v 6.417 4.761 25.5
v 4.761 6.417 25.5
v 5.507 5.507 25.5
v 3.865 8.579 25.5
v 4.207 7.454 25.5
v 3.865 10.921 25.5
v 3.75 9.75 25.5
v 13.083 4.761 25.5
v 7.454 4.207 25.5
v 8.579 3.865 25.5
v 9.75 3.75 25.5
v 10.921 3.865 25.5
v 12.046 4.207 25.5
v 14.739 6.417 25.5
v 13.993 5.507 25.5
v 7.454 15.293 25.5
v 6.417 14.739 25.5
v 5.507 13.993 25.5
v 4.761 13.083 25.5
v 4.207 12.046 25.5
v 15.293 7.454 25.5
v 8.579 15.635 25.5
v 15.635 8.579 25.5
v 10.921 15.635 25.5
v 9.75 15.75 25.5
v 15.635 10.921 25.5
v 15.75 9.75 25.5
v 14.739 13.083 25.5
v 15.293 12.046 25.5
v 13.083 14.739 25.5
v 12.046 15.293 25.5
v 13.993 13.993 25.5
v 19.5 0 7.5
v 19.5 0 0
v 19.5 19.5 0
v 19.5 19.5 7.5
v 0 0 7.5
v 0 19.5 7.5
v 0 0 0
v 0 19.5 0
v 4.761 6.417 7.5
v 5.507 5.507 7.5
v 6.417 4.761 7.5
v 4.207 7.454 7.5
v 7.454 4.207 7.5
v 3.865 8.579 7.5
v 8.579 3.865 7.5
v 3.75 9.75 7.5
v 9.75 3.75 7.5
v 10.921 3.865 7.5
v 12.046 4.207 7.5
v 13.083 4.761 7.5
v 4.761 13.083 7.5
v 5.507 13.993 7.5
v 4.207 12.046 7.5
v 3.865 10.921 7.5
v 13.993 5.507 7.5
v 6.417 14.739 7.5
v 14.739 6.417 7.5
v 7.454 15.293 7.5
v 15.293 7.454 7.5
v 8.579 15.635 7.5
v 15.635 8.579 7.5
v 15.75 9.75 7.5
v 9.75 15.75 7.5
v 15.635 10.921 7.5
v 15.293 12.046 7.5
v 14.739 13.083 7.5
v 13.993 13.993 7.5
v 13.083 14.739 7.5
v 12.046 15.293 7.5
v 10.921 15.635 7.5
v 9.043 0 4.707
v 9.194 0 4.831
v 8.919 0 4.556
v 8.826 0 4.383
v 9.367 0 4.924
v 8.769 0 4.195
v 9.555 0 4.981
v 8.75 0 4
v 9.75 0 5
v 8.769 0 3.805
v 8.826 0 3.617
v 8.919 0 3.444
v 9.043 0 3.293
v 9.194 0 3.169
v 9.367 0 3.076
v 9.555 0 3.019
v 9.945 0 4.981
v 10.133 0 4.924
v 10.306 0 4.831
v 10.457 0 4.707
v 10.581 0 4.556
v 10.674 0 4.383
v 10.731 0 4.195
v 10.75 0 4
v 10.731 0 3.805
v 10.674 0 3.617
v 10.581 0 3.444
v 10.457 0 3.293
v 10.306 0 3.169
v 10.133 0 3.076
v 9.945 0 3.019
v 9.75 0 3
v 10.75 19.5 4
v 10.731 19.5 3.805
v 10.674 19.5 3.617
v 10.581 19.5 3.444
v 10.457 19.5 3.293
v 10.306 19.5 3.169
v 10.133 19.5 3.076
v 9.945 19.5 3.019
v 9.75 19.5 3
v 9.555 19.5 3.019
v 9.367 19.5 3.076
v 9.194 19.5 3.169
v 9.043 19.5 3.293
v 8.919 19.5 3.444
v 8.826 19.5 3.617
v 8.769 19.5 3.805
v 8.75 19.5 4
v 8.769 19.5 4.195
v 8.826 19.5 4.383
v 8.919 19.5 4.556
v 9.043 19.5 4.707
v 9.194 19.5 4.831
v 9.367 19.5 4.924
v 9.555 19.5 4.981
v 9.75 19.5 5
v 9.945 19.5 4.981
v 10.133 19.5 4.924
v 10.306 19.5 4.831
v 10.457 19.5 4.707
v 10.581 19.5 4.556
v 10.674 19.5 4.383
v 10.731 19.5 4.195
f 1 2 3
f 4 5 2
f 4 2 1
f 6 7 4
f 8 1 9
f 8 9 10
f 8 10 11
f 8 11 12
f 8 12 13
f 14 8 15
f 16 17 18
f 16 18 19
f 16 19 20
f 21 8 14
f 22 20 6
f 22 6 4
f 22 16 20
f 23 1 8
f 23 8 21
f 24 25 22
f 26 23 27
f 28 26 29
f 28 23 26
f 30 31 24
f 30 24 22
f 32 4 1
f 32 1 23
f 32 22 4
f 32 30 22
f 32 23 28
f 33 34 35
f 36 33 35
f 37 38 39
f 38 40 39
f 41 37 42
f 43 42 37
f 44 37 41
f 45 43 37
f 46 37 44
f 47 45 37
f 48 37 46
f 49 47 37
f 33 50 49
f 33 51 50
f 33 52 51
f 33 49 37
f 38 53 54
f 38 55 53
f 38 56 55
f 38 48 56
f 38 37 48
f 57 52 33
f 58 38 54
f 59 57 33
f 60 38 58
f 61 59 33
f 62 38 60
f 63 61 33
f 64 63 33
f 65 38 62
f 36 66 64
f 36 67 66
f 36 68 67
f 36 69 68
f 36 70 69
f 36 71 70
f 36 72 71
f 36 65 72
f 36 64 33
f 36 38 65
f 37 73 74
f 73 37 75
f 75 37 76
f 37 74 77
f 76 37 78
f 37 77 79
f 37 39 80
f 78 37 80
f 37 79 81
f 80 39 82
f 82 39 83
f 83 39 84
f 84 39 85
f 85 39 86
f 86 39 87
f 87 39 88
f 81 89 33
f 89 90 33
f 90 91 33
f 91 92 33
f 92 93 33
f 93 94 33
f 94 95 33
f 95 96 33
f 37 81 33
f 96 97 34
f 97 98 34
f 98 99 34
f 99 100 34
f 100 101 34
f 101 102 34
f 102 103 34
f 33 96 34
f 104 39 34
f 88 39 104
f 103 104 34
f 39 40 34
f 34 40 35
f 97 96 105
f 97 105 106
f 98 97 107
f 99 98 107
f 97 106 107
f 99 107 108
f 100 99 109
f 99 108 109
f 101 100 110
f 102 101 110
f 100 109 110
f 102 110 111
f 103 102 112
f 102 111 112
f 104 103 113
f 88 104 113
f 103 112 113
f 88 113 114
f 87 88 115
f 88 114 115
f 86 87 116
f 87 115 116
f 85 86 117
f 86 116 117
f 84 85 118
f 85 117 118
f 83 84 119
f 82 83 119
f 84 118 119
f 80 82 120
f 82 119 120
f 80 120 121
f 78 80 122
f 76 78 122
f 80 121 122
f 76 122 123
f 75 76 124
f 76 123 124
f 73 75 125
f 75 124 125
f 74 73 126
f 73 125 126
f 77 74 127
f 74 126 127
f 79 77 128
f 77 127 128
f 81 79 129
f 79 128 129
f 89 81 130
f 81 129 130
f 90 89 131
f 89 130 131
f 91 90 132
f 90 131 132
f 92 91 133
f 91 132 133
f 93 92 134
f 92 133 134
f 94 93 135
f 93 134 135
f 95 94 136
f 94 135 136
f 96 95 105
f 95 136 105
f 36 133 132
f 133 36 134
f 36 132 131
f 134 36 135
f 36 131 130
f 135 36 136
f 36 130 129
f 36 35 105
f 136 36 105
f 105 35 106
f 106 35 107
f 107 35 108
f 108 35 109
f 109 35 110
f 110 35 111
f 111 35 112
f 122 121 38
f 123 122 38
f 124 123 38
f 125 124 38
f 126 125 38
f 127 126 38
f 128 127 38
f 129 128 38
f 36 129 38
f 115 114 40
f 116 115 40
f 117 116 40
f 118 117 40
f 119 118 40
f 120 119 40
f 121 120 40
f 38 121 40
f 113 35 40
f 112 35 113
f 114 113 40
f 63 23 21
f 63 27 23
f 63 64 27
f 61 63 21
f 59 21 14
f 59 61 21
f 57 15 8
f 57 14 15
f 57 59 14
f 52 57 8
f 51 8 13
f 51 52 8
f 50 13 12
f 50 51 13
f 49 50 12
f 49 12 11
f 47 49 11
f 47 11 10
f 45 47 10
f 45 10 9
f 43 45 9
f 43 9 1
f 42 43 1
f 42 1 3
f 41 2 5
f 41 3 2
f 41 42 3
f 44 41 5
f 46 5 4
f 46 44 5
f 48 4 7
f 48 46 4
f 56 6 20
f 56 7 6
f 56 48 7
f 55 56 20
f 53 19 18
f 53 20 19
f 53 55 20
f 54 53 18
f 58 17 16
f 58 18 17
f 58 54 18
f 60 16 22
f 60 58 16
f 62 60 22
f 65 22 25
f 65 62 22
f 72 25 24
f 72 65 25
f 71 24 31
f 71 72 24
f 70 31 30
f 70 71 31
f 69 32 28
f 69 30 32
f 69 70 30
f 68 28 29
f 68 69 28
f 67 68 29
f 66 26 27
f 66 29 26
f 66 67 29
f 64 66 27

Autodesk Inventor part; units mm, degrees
ref_plane "YZ Plane" through (0, 0, 0) normal (1, 0, 0) x (0, 1, 0)
ref_plane "XZ Plane" through (0, 0, 0) normal (0, 1, 0) x (-1, 0, 0)
ref_plane "XY Plane" through (0, 0, 0) normal (0, 0, 1) x (1, 0, 0)
sketch "Sketch1" plane through (0, 0, 0) normal (0, 0, 1) x (1, 0, 0)
  line L0 (0, 0) -> (19.5, 0)
  line L1 (19.5, 0) -> (19.5, 19.5)
  line L2 (19.5, 19.5) -> (0, 19.5)
  line L3 (0, 19.5) -> (0, 0)
  dimension "d0" = 19.5
  dimension "d1" = 19.5
extrude "Extrusion1" add sketch "Sketch1" along normal blind 7.5
sketch "Sketch6" plane through (0, 0, 7.5) normal (0, 0, 1) x (1, 0, 0)
  line L0 (19.5, 0) -> (19.5, 19.5) construction
  line L1 (19.5, 9.75) -> (0, 9.75) construction
  line L2 (0, 19.5) -> (0, 0) construction
  circle A0 centre (9.75, 9.75) radius 6
  dimension "d14" = 12
sketch "Sketch7" plane through (0, 0, 0) normal (-1, 0, 0) x (0, 0, 1)
  line L0 (0, 19.5) -> (0, 0) projected
  line L1 (0, 0) -> (7.5, 0) projected
  line L2 (7.5, 19.5) -> (7.5, 0) projected
  line L3 (0, 19.5) -> (7.5, 19.5) projected
  dimension "d15" = 7.5
extrude "Extrusion4" add sketch "Sketch6" along normal blind 18
sketch "Sketch8" plane through (0, 19.5, 0) normal (0, 1, 0) x (1, 0, 0)
  line L0 (19.5, 0) -> (0, 0) projected
  line L1 (0, 0) -> (19.5, 0) construction
  line L2 (9.75, 0) -> (9.75, -5) construction
  line L3 (9.75, -5) -> (11.9374, -5) construction
  circle A0 centre (9.75, -4) radius 1
  dimension "d18" = 5
  dimension "d19" = 2
extrude "Extrusion5" cut sketch "Sketch8" against normal up to surface (19.5 mm away)
properties part number "HDzero runcam with micro spacer"
